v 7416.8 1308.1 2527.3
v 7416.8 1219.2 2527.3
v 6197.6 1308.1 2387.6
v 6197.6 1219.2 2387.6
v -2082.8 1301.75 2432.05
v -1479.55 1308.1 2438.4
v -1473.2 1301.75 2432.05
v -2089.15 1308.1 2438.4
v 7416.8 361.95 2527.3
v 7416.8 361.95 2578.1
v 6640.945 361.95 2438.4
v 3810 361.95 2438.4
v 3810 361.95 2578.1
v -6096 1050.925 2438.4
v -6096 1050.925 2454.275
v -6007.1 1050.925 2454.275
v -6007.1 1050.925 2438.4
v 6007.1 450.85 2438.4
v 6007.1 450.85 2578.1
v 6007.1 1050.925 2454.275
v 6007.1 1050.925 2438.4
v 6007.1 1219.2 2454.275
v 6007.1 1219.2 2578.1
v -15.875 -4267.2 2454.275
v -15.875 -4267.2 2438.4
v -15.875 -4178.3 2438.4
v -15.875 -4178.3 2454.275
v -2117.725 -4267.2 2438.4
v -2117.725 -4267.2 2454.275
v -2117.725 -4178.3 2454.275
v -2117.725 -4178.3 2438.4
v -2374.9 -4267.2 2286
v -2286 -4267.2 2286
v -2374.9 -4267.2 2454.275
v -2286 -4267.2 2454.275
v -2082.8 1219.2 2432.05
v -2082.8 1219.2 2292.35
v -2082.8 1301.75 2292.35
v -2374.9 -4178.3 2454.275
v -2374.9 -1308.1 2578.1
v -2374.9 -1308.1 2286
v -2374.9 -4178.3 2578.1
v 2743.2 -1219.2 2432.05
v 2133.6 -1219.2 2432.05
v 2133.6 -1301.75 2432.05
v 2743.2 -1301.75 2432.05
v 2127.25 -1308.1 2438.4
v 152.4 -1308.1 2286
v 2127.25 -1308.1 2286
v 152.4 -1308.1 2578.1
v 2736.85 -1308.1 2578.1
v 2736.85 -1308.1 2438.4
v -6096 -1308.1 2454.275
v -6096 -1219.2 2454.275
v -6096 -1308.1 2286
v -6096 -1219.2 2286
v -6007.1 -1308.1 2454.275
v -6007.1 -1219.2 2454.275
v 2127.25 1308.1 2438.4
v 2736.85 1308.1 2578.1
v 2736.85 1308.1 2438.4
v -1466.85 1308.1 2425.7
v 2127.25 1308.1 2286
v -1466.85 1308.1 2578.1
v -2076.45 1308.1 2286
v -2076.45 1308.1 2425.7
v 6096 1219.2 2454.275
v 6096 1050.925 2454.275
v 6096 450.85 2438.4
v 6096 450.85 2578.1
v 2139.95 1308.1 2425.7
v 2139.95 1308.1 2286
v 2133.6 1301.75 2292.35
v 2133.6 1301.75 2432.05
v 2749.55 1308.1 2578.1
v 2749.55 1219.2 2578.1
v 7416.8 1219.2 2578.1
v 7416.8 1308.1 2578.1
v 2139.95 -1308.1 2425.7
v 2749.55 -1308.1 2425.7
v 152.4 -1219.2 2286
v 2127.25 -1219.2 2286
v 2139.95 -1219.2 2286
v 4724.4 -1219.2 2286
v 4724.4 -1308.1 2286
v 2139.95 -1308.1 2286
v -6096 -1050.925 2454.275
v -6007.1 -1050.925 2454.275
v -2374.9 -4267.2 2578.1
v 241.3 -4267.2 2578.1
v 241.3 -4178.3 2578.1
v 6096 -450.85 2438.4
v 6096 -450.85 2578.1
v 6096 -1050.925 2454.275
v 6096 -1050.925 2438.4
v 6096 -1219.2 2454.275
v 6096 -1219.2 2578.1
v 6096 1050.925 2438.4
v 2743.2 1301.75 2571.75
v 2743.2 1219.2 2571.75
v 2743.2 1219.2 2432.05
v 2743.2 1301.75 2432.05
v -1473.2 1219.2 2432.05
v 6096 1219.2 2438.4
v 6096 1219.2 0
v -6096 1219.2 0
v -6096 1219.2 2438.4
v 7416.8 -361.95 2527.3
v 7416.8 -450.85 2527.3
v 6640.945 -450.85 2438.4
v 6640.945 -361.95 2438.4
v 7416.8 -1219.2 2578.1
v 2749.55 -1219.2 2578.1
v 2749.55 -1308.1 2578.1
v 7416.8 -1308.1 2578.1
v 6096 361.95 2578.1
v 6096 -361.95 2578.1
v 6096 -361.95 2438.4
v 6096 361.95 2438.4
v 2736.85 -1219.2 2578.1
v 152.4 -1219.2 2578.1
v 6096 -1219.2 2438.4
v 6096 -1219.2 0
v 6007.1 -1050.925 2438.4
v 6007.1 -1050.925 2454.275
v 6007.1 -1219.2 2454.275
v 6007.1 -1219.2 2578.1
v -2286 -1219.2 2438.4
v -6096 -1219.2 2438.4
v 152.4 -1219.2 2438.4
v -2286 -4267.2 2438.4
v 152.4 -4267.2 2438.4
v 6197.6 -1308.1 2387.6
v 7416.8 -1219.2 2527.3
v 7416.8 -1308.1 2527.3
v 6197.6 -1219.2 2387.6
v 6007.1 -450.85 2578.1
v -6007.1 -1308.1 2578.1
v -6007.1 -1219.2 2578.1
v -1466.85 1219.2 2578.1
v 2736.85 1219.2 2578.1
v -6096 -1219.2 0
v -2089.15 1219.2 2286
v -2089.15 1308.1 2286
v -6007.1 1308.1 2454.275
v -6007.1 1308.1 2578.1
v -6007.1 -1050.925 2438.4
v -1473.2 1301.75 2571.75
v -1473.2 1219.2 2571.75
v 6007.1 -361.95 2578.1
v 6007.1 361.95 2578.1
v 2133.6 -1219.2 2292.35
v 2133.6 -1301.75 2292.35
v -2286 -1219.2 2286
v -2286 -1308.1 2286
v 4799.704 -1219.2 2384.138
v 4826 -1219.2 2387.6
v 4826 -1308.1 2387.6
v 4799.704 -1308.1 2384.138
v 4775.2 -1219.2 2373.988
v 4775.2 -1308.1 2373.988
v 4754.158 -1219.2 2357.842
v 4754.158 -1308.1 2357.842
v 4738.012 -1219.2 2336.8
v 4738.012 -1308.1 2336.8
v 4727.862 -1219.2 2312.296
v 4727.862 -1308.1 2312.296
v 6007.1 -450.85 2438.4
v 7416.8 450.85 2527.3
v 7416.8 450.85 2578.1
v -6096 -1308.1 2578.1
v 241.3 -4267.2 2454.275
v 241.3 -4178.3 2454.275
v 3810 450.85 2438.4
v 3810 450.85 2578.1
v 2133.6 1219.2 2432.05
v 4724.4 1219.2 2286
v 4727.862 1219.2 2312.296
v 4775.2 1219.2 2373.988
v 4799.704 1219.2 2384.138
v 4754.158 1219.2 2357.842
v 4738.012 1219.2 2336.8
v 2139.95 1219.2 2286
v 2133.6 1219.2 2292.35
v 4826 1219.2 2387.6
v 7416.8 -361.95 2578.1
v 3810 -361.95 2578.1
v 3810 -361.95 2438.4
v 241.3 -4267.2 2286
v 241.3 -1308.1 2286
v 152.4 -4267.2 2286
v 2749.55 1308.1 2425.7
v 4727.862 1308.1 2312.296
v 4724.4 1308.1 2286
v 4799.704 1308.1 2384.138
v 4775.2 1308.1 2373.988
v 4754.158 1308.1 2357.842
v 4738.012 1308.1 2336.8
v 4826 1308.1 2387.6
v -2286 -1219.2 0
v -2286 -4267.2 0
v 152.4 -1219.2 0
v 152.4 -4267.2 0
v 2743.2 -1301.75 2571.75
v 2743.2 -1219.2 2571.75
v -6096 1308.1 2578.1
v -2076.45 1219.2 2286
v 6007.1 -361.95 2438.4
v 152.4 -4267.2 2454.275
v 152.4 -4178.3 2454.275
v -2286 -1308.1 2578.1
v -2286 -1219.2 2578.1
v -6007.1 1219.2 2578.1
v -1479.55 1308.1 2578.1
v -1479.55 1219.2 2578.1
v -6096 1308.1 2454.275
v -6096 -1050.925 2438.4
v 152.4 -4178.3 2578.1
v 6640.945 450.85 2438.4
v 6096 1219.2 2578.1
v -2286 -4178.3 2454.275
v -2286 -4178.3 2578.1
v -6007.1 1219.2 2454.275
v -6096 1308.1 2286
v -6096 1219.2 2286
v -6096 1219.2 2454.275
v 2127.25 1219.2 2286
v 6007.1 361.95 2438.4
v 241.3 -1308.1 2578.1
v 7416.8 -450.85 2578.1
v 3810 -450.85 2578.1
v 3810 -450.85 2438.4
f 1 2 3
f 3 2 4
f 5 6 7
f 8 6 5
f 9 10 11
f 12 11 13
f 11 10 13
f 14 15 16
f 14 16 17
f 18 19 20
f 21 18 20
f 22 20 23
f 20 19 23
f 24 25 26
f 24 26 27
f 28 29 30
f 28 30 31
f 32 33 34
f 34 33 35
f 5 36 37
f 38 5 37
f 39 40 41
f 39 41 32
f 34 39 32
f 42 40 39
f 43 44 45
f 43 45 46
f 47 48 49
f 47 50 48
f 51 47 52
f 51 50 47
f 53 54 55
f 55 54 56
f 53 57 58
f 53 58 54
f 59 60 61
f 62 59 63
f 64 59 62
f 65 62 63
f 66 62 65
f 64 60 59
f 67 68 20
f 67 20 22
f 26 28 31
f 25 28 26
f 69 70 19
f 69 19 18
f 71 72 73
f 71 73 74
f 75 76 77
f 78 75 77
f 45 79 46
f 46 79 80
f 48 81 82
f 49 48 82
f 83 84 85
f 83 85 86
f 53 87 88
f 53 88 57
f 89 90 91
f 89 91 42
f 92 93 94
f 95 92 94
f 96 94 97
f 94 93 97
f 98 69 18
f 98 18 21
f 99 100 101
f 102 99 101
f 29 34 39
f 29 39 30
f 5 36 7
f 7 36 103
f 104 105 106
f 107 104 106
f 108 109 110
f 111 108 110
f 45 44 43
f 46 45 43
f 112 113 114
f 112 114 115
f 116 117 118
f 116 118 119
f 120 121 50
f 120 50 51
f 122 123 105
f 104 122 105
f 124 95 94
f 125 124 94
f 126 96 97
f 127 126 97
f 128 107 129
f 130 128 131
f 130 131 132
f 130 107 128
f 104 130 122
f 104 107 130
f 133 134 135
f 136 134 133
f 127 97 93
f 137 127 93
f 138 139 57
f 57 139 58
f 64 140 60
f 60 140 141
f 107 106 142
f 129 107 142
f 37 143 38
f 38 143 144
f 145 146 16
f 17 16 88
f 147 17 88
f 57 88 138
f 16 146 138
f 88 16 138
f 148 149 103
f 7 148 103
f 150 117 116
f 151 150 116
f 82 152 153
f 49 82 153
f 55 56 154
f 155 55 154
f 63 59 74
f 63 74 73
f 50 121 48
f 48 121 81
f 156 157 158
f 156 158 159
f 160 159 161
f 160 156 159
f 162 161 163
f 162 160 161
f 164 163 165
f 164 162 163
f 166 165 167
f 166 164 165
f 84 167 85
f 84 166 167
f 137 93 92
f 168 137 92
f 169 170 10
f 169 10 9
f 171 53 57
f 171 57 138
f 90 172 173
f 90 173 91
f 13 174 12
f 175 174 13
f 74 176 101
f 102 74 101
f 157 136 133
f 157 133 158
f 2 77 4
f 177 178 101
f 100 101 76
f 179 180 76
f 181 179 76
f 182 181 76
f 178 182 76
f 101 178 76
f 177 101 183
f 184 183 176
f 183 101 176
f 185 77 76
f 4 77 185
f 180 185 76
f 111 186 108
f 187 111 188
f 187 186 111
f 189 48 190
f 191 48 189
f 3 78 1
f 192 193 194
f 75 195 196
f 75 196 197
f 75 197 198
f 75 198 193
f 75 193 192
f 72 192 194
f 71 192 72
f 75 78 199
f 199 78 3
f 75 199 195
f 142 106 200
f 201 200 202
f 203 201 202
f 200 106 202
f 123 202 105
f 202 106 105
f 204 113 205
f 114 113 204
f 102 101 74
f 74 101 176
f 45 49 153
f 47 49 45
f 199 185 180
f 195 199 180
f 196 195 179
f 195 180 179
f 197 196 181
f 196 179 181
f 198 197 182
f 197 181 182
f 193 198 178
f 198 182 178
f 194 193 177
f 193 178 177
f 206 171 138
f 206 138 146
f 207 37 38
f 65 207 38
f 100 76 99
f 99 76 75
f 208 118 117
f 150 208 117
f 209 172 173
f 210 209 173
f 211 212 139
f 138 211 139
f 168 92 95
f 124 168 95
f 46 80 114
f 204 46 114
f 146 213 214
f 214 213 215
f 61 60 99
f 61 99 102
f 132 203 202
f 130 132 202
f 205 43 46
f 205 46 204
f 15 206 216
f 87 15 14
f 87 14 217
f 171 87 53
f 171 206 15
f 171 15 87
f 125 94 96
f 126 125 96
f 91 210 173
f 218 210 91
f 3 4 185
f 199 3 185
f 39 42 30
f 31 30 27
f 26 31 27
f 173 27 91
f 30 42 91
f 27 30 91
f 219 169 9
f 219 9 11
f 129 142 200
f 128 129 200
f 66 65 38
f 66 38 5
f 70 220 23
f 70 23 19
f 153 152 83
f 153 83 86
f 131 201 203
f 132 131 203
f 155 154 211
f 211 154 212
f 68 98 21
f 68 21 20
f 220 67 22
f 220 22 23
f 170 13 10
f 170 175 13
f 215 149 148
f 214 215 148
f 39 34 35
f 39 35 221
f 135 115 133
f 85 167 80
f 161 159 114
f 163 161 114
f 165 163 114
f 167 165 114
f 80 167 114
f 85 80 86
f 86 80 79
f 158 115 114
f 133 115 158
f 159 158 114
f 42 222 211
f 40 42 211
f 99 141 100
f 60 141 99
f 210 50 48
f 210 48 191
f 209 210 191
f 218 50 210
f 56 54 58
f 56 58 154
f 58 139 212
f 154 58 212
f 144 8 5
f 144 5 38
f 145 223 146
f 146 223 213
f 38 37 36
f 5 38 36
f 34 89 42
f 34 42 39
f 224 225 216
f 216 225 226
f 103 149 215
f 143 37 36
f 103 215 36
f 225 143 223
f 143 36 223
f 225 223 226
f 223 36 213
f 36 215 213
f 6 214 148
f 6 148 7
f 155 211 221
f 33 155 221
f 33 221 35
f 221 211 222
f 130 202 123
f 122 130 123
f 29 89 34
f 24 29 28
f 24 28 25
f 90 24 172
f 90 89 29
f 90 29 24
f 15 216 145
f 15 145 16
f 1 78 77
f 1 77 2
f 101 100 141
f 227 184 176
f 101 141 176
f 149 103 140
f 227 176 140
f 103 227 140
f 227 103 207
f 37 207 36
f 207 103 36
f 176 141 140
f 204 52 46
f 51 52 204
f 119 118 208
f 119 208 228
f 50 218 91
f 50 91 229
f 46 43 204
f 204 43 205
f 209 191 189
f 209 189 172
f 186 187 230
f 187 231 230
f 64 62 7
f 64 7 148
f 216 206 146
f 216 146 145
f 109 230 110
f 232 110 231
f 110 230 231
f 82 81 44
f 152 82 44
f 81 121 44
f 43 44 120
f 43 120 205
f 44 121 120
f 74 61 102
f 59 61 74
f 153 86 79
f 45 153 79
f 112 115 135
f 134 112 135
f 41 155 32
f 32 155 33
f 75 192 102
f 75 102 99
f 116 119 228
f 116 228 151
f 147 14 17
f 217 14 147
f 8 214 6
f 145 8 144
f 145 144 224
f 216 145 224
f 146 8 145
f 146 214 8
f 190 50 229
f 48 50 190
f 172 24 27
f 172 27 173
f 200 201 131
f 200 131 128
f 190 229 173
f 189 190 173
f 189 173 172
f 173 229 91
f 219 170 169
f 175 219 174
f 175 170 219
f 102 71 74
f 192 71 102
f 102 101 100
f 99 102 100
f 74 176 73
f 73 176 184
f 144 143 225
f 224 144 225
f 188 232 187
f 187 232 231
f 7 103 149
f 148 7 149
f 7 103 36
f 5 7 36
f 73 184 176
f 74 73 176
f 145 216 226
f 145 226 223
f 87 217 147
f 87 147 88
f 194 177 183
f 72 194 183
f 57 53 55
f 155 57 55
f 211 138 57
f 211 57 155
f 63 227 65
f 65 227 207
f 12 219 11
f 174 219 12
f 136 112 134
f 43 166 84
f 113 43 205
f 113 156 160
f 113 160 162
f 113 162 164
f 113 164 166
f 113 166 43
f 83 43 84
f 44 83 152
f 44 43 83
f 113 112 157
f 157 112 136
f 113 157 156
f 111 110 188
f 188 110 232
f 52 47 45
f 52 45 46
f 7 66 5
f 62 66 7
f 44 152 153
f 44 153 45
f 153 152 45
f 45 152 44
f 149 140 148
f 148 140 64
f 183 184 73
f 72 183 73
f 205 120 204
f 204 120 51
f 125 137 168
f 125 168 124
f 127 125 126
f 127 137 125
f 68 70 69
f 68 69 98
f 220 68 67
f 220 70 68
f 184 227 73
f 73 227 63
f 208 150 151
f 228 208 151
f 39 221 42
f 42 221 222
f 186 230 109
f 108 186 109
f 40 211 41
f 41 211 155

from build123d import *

# Parameters (mm, degrees)
F0_W       = 2438.4
F0_H       = 3048
F1_DEPTH   = 2438.4
F2_W       = 1066.8
F2_H       = 139.7
F3_DEPTH   = 88.9
F2_W_2     = 2590.8
F2_W_3     = 1625.6
F4_DEPTH   = 88.9
F5_DEPTH   = 88.9
F6_W       = 2590.8
F6_H       = 139.7
F7_DEPTH   = 88.9
F8_DEPTH   = 88.9
F11_DEPTH  = 44.45
F13_DEPTH  = 88.9
F14_W      = 2959.1
F14_H      = 152.4
F15_DEPTH  = 88.9
F19_DEPTH  = 88.9
F22_DEPTH  = 88.9
F24_W      = 723.9
F24_H      = 139.7
F25_DEPTH  = 88.9
F26_SIZE   = 6.35
F26_2_SIZE = 6.35
F26_3_SIZE = 6.35
F27_SIZE   = 6.35
F27_2_SIZE = 6.35


with BuildPart() as f1:
    # F0 (on Top) → F1 (new body)
    with BuildSketch(Plane.XY):
        Polygon((6096, 1219.2), (-6096, 1219.2), (-6096, -1219.2), (-2286, -1219.2), (152.4, -1219.2), (6096, -1219.2), align=None)
        with Locations((-1066.8, -2743.2)):
            Rectangle(F0_W, F0_H)
    extrude(amount=F1_DEPTH)


with BuildPart() as f3:
    # F2 (on face) → F3 (new body)
    with BuildSketch(Plane(origin=(0, 1219.2, 0), x_dir=(-1, 0, 0), z_dir=(0, 1, 0))):
        Polygon((-3810, 2578.1), (-7416.8, 2578.1), (-7416.8, 2527.3), (-6640.9454545455, 2438.4), (-6096, 2438.4), (-3810, 2438.4), align=None)
        with Locations((-3276.6, 2508.25)):
            Rectangle(F2_W, F2_H)
        with BuildLine():
            Line((-2743.2, 2438.4), (-3810, 2438.4))
            Line((-3810, 2438.4), (-6096, 2438.4))
            Line((-6096, 2438.4), (-6096, 2387.6))
            Line((-6096, 2387.6), (-4826, 2387.6))
            ThreePointArc((-4826, 2387.6), (-4754.1579510314, 2357.8420489686), (-4724.4, 2286))
            Line((-4724.4, 2286), (-2133.6, 2286))
            Line((-2133.6, 2286), (-2133.6, 2432.05))
            Line((-2133.6, 2432.05), (-2743.2, 2432.05))
            Line((-2743.2, 2432.05), (-2743.2, 2438.4))
        make_face()
        Polygon((-6096, 2438.4), (-6640.9454545455, 2438.4), (-6197.6, 2387.6), (-6096, 2387.6), align=None)
    extrude(amount=F3_DEPTH)


with BuildPart() as f4:
    # F2 (on face) → F4 (new body)
    with BuildSketch(Plane(origin=(0, 1219.2, 0), x_dir=(-1, 0, 0), z_dir=(0, 1, 0))):
        with Locations((-1447.8, 2508.25)):
            Rectangle(F2_W_2, F2_H)
        with Locations((660.4, 2508.25)):
            Rectangle(F2_W_3, F2_H)
        Polygon((1473.2, 2438.4), (-152.4, 2438.4), (-152.4, 2286), (2082.8, 2286), (2082.8, 2432.05), (1473.2, 2432.05), align=None)
        Polygon((-152.4, 2438.4), (-2743.2, 2438.4), (-2743.2, 2432.05), (-2133.6, 2432.05), (-2133.6, 2286), (-152.4, 2286), align=None)
    extrude(amount=F4_DEPTH)

    # F27#2
    f27_2_edges = [f4.edges().sort_by_distance(p)[0] for p in [
        (2743.2, 1308.1, 2505.075),
        (2743.2, 1263.65, 2578.1),
        (2438.4, 1308.1, 2432.05),
        (2133.6, 1308.1, 2359.025),
        (2133.6, 1263.65, 2286),
        (-1473.2, 1263.65, 2578.1),
        (-1473.2, 1308.1, 2505.075),
        (-1778, 1308.1, 2432.05),
        (-2082.8, 1308.1, 2359.025),
        (-2082.8, 1263.65, 2286),
    ]]
    chamfer(f27_2_edges, length=F27_2_SIZE)


with BuildPart() as f5:
    # F2 (on face) → F5 (new body)
    with BuildSketch(Plane(origin=(0, 1219.2, 0), x_dir=(-1, 0, 0), z_dir=(0, 1, 0))):
        Polygon((6007.1, 2578.1), (1473.2, 2578.1), (1473.2, 2438.4), (6096, 2438.4), (6096, 2454.275), (6007.1, 2454.275), align=None)
        Polygon((6096, 2438.4), (1473.2, 2438.4), (1473.2, 2432.05), (2082.8, 2432.05), (2082.8, 2286), (6096, 2286), align=None)
    extrude(amount=F5_DEPTH)

    # F26#2
    f26_2_edges = [f5.edges().sort_by_distance(p)[0] for p in [
        (-1473.2, 1263.65, 2578.1),
        (-1473.2, 1308.1, 2505.075),
        (-1778, 1308.1, 2432.05),
        (-2082.8, 1308.1, 2359.025),
        (-2082.8, 1263.65, 2286),
    ]]
    chamfer(f26_2_edges, length=F26_2_SIZE)


with BuildPart() as f7:
    # F6 (on face) → F7 (new body)
    with BuildSketch(Plane.XZ.offset(1219.2)):
        with Locations((1447.8, 2508.25)):
            Rectangle(F6_W, F6_H)
        Polygon((2743.2, 2432.05), (2743.2, 2438.4), (152.4, 2438.4), (152.4, 2286), (2133.6, 2286), (2133.6, 2432.05), align=None)
    extrude(amount=F7_DEPTH)

    # F26#3
    f26_3_edges = [f7.edges().sort_by_distance(p)[0] for p in [
        (2133.6, -1308.1, 2359.025),
        (2438.4, -1308.1, 2432.05),
        (2743.2, -1308.1, 2505.075),
        (2743.2, -1263.65, 2578.1),
        (2133.6, -1263.65, 2286),
    ]]
    chamfer(f26_3_edges, length=F26_3_SIZE)


with BuildPart() as f8:
    # F6 (on face) → F8 (new body)
    with BuildSketch(Plane.XZ.offset(1219.2)):
        Polygon((-2286, 2286), (-2286, 2578.1), (-6007.1, 2578.1), (-6007.1, 2454.275), (-6096, 2454.275), (-6096, 2286), align=None)
    extrude(amount=F8_DEPTH)


with BuildPart() as f11:
    # F10 (on offset) → F11 (new body, symmetric)
    with BuildSketch(Plane(origin=(0, 406.4, 0), x_dir=(-1, 0, 0), z_dir=(0, 1, 0))):
        Polygon((-3810, 2578.1), (-7416.8, 2578.1), (-7416.8, 2527.3), (-6640.9454545455, 2438.4), (-3810, 2438.4), align=None)
    extrude(amount=F11_DEPTH, both=True)


with BuildPart() as f13:
    # F12 (on face) → F13 (new body)
    with BuildSketch(Plane(origin=(-6096, 0, 0), x_dir=(0, -1, 0), z_dir=(-1, 0, 0))):
        Polygon((1308.1, 2578.1), (-1308.1, 2578.1), (-1308.1, 2454.275), (-1050.925, 2454.275), (-1050.925, 2438.4), (1050.925, 2438.4), (1050.925, 2454.275), (1308.1, 2454.275), align=None)
    extrude(amount=-F13_DEPTH)


with BuildPart() as f15:
    # F14 (on face) → F15 (new body)
    with BuildSketch(Plane(origin=(-2286, 0, 0), x_dir=(0, -1, 0), z_dir=(-1, 0, 0))):
        Polygon((4178.3, 2578.1), (1308.1, 2578.1), (1308.1, 2438.4), (4267.2, 2438.4), (4267.2, 2454.275), (4178.3, 2454.275), align=None)
        with Locations((2787.65, 2362.2)):
            Rectangle(F14_W, F14_H)
    extrude(amount=F15_DEPTH)


with BuildPart() as f17_1:
    # F17: instance of F15
    add(f15.part.mirror(Plane(origin=(-1066.8, -2743.2, 1219.2), x_dir=(0, -1, 0), z_dir=(-1, 0, 0))))


with BuildPart() as f19:
    # F18 (on face) → F19 (new body)
    with BuildSketch(Plane.XZ.offset(4267.2)):
        Polygon((241.3, 2578.1), (-2374.9, 2578.1), (-2374.9, 2454.275), (-2117.725, 2454.275), (-2117.725, 2438.4), (-15.875, 2438.4), (-15.875, 2454.275), (241.3, 2454.275), align=None)
    extrude(amount=-F19_DEPTH)


with BuildPart() as f22:
    # F21 (on face) → F22 (new body)
    with BuildSketch(Plane.YZ.offset(6096)):
        Polygon((1219.2, 2454.275), (1219.2, 2578.1), (450.85, 2578.1), (450.85, 2438.4), (1050.925, 2438.4), (1050.925, 2454.275), align=None)
    extrude(amount=-F22_DEPTH)


with BuildPart() as f23_1:
    # F23: instance of F3
    add(f3.part.mirror(Plane(origin=(1562.1, 0, 609.6), x_dir=(1, 0, 0), z_dir=(0, -1, 0))))

    # F27
    f27_edges = [f23_1.edges().sort_by_distance(p)[0] for p in [
        (2743.2, -1308.1, 2505.075),
        (2438.4, -1308.1, 2432.05),
        (2743.2, -1263.65, 2578.1),
        (2133.6, -1308.1, 2359.025),
        (2133.6, -1263.65, 2286),
    ]]
    chamfer(f27_edges, length=F27_SIZE)


with BuildPart() as f23_2:
    # F23: instance of F22
    add(f22.part.mirror(Plane(origin=(1562.1, 0, 609.6), x_dir=(1, 0, 0), z_dir=(0, -1, 0))))


with BuildPart() as f23_3:
    # F23: instance of F11
    add(f11.part.mirror(Plane(origin=(1562.1, 0, 609.6), x_dir=(1, 0, 0), z_dir=(0, -1, 0))))


with BuildPart() as f25:
    # F24 (on face) → F25 (new body)
    with BuildSketch(Plane.YZ.offset(6096)):
        with Locations((0, 2508.25)):
            Rectangle(F24_W, F24_H)
    extrude(amount=-F25_DEPTH)


with BuildPart() as f3_1:
    add(f3.part)

    # F26
    f26_edges = [f3_1.edges().sort_by_distance(p)[0] for p in [
        (2743.2, 1263.65, 2578.1),
        (2743.2, 1308.1, 2505.075),
        (2438.4, 1308.1, 2432.05),
        (2133.6, 1308.1, 2359.025),
        (2133.6, 1263.65, 2286),
    ]]
    chamfer(f26_edges, length=F26_SIZE)


solid = Compound([f1.part, f4.part, f5.part, f7.part, f8.part, f11.part, f13.part, f15.part, f17_1.part, f19.part, f22.part, f23_1.part, f23_2.part, f23_3.part, f25.part, f3_1.part])
